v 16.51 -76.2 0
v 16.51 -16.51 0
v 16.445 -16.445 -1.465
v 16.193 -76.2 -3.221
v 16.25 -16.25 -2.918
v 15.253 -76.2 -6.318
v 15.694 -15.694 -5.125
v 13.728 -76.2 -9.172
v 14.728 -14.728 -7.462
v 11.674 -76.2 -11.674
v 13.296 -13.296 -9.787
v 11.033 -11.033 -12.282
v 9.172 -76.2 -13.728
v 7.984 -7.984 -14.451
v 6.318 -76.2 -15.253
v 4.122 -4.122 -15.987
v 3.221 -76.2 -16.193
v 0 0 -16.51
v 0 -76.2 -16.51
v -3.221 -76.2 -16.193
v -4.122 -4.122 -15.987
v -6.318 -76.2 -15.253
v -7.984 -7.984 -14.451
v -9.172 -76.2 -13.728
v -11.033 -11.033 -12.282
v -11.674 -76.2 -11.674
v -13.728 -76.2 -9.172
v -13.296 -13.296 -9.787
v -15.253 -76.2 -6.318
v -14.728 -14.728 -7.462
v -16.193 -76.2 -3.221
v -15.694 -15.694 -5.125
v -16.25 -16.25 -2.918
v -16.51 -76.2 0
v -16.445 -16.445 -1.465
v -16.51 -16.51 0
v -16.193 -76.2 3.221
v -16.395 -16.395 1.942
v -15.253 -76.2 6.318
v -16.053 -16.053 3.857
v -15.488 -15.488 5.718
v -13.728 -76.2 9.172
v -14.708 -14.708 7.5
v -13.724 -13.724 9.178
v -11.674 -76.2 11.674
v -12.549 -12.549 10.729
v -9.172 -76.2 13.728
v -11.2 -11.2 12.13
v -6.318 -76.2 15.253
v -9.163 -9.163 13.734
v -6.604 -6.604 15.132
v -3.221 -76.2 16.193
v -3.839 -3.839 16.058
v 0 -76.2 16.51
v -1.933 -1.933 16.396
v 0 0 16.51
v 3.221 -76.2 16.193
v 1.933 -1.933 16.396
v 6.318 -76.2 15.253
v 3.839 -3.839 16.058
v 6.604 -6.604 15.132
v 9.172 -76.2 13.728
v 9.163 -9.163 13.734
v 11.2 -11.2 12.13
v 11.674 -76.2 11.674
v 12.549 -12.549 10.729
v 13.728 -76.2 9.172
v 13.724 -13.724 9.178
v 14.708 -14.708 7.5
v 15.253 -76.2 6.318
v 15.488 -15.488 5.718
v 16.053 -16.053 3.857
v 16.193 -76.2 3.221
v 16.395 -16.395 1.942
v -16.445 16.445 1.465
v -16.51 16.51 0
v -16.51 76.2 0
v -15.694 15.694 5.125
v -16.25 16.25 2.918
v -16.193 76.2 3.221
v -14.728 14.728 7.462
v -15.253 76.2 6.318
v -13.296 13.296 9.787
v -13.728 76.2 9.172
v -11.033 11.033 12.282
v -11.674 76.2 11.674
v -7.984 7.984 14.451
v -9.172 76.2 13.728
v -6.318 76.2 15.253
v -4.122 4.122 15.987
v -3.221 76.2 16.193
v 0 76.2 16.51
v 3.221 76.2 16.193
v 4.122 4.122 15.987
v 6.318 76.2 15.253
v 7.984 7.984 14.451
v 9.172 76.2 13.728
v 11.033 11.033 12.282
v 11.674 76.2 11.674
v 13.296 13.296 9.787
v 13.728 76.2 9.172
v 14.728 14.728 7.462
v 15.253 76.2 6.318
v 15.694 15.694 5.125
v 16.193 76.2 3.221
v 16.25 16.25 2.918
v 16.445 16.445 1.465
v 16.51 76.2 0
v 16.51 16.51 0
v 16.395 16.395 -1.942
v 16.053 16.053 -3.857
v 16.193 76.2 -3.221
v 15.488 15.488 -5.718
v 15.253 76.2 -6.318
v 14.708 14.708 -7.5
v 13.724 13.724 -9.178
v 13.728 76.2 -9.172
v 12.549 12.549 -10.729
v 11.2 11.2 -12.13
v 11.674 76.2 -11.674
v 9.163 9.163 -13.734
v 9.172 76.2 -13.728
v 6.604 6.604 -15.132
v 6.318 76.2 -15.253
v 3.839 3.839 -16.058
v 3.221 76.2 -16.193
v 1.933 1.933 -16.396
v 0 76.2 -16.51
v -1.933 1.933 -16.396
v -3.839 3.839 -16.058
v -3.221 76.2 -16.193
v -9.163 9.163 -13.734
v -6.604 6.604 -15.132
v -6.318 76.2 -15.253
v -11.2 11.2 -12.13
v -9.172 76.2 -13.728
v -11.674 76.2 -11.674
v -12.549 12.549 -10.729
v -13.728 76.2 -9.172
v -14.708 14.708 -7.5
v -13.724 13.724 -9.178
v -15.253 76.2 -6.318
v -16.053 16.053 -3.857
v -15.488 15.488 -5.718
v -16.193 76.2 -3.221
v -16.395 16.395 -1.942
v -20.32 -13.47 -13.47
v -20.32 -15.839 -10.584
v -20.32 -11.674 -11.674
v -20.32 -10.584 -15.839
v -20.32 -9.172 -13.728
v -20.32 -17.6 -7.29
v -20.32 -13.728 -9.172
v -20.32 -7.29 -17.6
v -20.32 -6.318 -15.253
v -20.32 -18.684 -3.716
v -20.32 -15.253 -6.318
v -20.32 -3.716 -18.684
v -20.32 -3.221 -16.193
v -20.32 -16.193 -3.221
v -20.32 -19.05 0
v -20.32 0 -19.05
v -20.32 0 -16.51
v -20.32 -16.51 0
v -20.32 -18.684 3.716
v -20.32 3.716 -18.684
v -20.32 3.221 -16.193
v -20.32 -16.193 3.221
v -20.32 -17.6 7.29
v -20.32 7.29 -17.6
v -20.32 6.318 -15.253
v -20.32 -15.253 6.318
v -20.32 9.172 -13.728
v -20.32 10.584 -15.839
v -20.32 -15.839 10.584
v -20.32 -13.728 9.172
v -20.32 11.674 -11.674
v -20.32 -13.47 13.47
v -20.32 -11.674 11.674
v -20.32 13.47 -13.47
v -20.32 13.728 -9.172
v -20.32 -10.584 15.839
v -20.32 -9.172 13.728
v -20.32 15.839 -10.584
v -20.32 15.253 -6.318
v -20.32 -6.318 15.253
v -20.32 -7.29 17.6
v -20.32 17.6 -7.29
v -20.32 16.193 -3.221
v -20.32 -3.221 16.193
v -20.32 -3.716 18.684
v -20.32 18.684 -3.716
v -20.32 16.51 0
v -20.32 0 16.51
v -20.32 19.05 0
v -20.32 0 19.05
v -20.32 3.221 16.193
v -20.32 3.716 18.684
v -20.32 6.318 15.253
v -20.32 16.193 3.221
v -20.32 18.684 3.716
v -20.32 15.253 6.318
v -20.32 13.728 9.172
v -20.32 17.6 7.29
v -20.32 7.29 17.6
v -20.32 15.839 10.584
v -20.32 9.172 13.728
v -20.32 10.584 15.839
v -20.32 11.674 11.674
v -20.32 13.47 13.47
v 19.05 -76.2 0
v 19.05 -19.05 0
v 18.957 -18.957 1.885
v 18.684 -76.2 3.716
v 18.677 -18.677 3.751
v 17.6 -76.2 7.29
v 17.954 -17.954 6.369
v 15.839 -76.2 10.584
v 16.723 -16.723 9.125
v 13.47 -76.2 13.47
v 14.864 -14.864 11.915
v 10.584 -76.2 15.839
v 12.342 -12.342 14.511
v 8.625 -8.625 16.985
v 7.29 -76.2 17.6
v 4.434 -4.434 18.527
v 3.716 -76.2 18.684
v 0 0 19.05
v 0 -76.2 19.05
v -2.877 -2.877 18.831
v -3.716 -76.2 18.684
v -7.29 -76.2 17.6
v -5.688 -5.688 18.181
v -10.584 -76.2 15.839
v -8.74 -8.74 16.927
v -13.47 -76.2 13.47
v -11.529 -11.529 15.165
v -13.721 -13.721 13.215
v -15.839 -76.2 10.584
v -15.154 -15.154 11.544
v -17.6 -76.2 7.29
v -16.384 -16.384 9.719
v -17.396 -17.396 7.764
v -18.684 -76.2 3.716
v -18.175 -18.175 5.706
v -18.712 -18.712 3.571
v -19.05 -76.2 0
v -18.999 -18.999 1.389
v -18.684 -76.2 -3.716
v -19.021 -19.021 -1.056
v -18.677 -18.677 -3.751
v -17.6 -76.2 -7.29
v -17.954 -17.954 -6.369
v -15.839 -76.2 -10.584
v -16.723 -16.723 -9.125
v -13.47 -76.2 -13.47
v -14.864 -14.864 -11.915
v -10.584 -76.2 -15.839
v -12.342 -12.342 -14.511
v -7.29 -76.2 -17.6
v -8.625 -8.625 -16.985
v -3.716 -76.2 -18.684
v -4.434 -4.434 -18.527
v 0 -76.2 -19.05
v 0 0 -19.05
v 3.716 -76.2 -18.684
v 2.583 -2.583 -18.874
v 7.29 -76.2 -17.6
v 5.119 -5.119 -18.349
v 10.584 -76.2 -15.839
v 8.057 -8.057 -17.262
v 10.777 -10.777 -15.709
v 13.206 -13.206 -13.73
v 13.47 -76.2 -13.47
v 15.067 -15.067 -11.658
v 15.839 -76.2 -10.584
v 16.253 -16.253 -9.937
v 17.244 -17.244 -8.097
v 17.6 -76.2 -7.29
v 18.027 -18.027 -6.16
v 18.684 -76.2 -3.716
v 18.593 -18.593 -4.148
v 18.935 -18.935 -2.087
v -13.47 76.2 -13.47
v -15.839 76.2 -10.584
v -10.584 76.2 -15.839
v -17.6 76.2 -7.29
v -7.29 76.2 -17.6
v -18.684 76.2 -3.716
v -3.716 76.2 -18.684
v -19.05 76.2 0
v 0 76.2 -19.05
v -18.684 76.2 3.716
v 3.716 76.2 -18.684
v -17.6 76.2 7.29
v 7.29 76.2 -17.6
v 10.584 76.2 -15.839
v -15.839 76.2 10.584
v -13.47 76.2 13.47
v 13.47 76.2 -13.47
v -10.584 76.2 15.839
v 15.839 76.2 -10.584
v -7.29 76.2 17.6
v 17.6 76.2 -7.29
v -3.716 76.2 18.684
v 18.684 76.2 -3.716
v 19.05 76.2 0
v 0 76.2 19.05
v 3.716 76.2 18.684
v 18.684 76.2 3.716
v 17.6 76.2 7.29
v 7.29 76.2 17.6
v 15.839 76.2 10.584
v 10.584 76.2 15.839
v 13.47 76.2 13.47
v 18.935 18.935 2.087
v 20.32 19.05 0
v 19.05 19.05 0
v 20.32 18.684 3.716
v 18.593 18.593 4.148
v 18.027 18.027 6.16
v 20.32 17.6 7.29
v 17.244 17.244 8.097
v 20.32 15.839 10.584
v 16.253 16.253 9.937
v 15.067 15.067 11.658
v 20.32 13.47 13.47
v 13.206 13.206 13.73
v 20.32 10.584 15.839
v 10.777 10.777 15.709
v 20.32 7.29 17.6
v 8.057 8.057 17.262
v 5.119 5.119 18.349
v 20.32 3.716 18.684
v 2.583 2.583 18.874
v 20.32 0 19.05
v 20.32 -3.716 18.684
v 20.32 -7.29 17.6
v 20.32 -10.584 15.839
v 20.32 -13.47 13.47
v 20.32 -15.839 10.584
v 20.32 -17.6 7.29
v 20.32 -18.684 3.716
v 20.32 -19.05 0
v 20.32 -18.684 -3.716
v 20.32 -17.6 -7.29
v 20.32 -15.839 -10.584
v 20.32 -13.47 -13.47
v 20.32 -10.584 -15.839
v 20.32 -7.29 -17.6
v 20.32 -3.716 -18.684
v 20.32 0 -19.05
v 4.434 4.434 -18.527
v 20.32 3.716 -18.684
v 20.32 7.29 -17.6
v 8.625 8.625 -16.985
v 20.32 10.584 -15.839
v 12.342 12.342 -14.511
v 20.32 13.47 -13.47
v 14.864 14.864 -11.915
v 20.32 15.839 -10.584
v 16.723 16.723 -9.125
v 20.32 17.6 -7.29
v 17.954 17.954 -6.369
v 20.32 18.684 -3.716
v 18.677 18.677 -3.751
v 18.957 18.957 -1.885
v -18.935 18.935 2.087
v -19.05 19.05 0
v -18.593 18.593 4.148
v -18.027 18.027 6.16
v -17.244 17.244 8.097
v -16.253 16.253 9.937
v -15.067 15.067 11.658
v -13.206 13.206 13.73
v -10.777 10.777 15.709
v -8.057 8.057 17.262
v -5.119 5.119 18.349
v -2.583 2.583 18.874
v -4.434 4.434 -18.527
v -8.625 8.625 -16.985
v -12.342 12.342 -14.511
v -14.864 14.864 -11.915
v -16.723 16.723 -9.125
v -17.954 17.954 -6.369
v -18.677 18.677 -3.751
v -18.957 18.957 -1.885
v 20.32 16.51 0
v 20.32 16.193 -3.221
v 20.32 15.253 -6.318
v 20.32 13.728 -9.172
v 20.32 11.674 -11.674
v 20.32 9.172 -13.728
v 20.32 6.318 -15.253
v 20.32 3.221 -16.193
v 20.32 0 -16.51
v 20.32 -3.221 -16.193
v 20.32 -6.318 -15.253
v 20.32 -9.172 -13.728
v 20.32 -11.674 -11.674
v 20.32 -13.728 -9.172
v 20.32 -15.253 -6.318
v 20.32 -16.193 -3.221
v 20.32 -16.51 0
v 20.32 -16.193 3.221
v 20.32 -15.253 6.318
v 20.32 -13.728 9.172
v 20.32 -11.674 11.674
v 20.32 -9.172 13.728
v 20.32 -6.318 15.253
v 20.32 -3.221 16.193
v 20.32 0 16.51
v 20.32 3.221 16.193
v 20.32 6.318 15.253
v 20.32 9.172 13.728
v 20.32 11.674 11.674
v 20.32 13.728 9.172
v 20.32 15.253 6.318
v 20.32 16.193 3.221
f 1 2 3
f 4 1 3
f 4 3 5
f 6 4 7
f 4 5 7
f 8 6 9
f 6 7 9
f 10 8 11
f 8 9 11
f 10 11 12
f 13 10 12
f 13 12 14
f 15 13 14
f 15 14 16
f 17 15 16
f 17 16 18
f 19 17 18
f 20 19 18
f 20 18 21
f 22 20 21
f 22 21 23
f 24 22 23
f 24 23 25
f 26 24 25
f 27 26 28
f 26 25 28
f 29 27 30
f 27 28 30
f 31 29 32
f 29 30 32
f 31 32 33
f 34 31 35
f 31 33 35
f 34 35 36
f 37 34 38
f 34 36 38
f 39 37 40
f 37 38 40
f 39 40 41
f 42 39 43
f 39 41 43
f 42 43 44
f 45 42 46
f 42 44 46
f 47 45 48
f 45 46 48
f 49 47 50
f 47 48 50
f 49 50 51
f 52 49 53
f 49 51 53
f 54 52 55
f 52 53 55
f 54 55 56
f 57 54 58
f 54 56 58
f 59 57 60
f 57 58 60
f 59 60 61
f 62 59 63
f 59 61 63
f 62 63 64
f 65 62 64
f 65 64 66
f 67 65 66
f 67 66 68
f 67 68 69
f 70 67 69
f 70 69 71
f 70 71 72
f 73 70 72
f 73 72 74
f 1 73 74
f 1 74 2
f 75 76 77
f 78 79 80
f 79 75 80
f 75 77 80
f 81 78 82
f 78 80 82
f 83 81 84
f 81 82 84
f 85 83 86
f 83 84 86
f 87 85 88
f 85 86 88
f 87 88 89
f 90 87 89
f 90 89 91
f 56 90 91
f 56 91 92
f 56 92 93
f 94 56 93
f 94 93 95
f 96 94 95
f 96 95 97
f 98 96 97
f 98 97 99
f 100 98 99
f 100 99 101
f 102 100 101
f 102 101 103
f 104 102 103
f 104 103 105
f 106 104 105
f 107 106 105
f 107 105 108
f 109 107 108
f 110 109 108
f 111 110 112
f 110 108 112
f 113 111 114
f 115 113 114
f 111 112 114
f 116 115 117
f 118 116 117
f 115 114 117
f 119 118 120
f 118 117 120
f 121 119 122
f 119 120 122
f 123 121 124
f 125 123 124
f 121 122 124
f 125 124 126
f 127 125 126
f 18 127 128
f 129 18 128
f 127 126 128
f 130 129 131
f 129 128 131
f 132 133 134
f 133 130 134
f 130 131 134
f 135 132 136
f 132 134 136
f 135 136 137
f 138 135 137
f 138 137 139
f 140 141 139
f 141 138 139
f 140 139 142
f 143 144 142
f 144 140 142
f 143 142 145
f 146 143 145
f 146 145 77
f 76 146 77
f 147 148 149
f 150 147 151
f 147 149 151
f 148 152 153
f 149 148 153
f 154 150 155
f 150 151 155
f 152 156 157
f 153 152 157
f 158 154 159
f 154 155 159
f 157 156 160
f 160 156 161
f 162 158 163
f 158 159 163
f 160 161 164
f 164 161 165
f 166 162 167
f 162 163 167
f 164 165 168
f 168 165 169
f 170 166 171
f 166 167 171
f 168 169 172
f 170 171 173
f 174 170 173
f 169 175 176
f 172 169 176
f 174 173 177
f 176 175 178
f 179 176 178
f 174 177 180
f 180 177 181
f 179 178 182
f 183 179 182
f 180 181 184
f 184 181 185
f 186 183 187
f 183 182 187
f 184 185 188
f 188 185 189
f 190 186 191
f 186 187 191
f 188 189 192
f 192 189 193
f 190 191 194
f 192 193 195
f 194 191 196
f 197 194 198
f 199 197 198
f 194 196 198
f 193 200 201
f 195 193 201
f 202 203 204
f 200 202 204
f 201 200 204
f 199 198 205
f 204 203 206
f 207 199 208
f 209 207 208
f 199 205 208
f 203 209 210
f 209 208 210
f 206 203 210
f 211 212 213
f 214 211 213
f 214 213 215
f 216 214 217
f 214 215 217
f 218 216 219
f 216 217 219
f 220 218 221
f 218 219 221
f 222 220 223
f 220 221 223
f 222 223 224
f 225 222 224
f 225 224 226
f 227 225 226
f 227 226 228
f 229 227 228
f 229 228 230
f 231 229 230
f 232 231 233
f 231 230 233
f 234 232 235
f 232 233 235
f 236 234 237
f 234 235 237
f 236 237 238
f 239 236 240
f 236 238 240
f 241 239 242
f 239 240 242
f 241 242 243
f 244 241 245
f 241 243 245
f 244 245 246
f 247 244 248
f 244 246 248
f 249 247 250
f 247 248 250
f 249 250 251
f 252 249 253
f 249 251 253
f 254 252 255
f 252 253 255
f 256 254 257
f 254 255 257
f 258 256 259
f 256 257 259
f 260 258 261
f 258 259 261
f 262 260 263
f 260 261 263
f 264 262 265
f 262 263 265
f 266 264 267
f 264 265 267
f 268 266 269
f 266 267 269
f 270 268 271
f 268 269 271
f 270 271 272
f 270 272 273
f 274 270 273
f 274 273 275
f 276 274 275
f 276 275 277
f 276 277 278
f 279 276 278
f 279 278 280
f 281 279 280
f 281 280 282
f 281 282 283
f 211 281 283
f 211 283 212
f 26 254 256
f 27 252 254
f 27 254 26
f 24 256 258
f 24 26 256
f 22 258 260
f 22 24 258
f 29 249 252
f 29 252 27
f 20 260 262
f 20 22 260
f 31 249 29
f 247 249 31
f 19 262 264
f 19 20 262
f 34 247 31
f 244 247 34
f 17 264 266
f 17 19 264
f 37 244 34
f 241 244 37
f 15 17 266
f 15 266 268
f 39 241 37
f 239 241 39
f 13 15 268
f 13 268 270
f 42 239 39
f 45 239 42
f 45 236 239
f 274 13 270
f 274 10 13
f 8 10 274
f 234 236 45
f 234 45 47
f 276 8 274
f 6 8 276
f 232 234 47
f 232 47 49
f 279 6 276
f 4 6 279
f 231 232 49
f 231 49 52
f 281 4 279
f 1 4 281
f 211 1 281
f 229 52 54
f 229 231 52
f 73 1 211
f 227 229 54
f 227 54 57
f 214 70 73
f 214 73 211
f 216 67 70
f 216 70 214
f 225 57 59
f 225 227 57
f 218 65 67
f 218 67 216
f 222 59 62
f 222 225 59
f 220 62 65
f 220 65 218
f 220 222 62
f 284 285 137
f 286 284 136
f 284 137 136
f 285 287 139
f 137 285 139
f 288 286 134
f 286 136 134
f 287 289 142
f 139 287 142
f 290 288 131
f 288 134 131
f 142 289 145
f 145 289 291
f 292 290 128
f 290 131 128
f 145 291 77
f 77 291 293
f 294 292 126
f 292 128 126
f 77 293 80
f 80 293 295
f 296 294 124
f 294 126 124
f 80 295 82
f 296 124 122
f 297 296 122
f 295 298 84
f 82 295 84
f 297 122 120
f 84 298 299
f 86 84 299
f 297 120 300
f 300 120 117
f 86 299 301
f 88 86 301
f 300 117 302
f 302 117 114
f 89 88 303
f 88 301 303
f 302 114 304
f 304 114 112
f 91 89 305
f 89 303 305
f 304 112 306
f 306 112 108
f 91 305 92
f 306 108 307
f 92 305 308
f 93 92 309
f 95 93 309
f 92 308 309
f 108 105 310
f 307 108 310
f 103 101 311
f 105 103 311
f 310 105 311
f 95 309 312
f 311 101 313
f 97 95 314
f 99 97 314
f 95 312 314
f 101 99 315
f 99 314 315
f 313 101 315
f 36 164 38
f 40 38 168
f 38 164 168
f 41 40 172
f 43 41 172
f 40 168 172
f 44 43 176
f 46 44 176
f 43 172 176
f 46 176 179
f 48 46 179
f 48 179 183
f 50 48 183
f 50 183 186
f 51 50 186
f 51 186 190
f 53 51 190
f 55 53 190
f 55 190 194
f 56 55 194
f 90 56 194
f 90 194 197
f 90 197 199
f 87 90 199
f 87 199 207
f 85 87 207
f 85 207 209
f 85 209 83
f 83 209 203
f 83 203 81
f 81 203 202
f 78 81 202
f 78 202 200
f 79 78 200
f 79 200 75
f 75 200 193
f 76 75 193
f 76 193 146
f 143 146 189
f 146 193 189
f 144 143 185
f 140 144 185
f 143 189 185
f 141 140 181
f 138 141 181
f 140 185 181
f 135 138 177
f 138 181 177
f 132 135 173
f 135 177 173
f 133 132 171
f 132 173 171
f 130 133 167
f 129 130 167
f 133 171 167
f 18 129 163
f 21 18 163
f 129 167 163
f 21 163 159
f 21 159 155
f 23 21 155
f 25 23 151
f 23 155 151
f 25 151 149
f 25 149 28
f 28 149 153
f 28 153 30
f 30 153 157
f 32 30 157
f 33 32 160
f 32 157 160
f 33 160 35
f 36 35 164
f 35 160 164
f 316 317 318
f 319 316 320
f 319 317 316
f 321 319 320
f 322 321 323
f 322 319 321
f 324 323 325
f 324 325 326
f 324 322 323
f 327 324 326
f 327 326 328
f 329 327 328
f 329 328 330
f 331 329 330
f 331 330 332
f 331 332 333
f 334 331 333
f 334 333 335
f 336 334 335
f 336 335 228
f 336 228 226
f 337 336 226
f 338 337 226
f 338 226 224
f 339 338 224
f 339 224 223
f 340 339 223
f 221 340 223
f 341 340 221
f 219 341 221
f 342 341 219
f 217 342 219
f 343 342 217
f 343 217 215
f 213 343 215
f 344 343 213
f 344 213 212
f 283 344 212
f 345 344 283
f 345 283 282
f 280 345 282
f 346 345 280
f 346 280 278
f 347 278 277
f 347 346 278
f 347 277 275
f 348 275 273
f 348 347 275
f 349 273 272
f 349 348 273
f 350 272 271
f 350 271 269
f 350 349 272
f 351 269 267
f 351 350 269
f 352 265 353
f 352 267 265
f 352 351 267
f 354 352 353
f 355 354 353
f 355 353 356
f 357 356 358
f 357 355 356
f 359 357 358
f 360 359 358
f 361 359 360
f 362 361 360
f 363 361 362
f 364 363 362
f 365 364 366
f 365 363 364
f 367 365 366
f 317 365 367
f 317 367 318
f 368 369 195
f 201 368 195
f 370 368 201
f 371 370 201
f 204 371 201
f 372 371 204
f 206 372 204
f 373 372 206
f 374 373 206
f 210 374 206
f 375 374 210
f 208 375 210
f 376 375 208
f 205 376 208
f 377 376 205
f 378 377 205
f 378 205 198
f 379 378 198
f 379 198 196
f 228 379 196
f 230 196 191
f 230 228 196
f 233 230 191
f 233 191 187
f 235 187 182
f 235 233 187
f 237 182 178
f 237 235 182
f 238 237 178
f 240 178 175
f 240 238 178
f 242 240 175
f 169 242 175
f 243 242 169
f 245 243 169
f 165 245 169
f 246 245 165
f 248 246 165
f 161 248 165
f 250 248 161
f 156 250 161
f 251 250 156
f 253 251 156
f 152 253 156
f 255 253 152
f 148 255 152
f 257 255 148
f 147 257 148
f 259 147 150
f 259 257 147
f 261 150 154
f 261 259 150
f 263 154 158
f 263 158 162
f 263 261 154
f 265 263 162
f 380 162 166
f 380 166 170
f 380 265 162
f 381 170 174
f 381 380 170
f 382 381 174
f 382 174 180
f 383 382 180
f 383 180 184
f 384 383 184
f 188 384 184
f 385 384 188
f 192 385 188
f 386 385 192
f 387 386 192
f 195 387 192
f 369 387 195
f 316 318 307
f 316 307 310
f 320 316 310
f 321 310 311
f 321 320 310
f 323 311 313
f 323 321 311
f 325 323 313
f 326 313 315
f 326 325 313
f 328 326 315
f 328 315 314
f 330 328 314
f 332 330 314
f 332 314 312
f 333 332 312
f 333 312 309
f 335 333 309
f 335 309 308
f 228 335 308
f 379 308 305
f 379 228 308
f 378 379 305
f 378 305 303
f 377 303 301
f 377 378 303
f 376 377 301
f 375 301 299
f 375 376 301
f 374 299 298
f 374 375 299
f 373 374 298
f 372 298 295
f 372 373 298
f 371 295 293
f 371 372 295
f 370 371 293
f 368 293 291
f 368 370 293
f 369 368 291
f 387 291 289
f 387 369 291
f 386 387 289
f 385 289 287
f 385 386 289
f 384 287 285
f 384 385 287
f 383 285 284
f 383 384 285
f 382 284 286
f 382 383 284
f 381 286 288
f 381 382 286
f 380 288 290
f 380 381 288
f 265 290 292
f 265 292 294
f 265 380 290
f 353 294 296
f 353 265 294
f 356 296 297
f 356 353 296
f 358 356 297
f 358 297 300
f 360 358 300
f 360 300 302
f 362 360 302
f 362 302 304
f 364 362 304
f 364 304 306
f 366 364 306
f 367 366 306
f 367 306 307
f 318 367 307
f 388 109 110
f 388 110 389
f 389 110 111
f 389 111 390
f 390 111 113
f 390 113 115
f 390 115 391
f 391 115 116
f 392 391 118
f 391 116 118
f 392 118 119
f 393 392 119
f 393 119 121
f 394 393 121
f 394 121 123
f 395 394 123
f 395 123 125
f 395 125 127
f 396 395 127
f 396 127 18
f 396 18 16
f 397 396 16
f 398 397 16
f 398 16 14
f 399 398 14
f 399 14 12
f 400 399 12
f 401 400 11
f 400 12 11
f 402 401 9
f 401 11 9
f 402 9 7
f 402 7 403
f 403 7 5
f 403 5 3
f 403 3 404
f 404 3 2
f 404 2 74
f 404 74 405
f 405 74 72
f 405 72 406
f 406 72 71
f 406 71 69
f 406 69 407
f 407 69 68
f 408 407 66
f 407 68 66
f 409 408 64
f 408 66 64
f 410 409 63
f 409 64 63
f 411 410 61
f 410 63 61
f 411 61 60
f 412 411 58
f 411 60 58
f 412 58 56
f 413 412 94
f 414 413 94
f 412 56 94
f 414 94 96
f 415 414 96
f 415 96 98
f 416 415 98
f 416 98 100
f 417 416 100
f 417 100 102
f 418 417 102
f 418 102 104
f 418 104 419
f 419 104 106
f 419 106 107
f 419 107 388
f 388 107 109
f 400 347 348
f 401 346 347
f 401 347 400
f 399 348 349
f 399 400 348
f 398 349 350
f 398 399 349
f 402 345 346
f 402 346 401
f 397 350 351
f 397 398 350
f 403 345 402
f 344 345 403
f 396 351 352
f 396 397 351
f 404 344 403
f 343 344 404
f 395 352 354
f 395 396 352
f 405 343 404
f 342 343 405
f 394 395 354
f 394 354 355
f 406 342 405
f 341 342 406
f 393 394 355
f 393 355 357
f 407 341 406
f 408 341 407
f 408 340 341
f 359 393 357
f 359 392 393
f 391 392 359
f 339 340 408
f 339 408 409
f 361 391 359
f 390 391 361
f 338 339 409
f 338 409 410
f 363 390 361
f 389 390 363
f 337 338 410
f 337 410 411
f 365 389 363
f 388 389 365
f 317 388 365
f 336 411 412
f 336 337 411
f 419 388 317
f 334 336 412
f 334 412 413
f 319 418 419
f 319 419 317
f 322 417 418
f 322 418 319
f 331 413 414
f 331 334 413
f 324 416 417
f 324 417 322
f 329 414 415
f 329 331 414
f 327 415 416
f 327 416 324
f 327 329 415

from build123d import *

# Parameters (mm, degrees)
F0_R     = 19.05
F1_DEPTH = 76.2
F2_R     = 19.05
F3_DEPTH = 20.32
F4_DEPTH = 76.2
F5_D     = 33.02
F5_DEPTH = 20.321
F6_D     = 33.02
F7_D     = 33.02
F7_DEPTH = 76.201
F8_D     = 33.02


with BuildPart() as f1:
    # F0 (on Front) → F1 (new body)
    with BuildSketch(Plane.XZ):
        Circle(F0_R)
    extrude(amount=F1_DEPTH)

    # F2 (on Right) → F3 (join, symmetric)
    with BuildSketch(Plane.YZ):
        Circle(F2_R)
    extrude(amount=F3_DEPTH, both=True)

    # F0 (on Front) → F4 (join)
    with BuildSketch(Plane.XZ):
        Circle(F0_R)
    extrude(amount=-F4_DEPTH)

    # F5 (through all, one way)
    with BuildSketch(Plane(origin=(0, 0, 0), x_dir=(0, 1, 0), z_dir=(-1, 0, 0))):
        with Locations((0, 0)):
            Circle(F5_D / 2)
    extrude(amount=-F5_DEPTH, mode=Mode.SUBTRACT)

    # F6 (through all)
    with Locations(Plane.YZ):
        with Locations((0, 0)):
            Hole(F6_D / 2)

    # F7 (through all, one way)
    with BuildSketch(Plane(origin=(0, 0, 0), x_dir=(1, 0, 0), z_dir=(0, 1, 0))):
        with Locations((0, 0)):
            Circle(F7_D / 2)
    extrude(amount=-F7_DEPTH, mode=Mode.SUBTRACT)

    # F8 (through all)
    with Locations(Plane.XZ):
        with Locations((0, 0)):
            Hole(F8_D / 2)


solid = f1.part
